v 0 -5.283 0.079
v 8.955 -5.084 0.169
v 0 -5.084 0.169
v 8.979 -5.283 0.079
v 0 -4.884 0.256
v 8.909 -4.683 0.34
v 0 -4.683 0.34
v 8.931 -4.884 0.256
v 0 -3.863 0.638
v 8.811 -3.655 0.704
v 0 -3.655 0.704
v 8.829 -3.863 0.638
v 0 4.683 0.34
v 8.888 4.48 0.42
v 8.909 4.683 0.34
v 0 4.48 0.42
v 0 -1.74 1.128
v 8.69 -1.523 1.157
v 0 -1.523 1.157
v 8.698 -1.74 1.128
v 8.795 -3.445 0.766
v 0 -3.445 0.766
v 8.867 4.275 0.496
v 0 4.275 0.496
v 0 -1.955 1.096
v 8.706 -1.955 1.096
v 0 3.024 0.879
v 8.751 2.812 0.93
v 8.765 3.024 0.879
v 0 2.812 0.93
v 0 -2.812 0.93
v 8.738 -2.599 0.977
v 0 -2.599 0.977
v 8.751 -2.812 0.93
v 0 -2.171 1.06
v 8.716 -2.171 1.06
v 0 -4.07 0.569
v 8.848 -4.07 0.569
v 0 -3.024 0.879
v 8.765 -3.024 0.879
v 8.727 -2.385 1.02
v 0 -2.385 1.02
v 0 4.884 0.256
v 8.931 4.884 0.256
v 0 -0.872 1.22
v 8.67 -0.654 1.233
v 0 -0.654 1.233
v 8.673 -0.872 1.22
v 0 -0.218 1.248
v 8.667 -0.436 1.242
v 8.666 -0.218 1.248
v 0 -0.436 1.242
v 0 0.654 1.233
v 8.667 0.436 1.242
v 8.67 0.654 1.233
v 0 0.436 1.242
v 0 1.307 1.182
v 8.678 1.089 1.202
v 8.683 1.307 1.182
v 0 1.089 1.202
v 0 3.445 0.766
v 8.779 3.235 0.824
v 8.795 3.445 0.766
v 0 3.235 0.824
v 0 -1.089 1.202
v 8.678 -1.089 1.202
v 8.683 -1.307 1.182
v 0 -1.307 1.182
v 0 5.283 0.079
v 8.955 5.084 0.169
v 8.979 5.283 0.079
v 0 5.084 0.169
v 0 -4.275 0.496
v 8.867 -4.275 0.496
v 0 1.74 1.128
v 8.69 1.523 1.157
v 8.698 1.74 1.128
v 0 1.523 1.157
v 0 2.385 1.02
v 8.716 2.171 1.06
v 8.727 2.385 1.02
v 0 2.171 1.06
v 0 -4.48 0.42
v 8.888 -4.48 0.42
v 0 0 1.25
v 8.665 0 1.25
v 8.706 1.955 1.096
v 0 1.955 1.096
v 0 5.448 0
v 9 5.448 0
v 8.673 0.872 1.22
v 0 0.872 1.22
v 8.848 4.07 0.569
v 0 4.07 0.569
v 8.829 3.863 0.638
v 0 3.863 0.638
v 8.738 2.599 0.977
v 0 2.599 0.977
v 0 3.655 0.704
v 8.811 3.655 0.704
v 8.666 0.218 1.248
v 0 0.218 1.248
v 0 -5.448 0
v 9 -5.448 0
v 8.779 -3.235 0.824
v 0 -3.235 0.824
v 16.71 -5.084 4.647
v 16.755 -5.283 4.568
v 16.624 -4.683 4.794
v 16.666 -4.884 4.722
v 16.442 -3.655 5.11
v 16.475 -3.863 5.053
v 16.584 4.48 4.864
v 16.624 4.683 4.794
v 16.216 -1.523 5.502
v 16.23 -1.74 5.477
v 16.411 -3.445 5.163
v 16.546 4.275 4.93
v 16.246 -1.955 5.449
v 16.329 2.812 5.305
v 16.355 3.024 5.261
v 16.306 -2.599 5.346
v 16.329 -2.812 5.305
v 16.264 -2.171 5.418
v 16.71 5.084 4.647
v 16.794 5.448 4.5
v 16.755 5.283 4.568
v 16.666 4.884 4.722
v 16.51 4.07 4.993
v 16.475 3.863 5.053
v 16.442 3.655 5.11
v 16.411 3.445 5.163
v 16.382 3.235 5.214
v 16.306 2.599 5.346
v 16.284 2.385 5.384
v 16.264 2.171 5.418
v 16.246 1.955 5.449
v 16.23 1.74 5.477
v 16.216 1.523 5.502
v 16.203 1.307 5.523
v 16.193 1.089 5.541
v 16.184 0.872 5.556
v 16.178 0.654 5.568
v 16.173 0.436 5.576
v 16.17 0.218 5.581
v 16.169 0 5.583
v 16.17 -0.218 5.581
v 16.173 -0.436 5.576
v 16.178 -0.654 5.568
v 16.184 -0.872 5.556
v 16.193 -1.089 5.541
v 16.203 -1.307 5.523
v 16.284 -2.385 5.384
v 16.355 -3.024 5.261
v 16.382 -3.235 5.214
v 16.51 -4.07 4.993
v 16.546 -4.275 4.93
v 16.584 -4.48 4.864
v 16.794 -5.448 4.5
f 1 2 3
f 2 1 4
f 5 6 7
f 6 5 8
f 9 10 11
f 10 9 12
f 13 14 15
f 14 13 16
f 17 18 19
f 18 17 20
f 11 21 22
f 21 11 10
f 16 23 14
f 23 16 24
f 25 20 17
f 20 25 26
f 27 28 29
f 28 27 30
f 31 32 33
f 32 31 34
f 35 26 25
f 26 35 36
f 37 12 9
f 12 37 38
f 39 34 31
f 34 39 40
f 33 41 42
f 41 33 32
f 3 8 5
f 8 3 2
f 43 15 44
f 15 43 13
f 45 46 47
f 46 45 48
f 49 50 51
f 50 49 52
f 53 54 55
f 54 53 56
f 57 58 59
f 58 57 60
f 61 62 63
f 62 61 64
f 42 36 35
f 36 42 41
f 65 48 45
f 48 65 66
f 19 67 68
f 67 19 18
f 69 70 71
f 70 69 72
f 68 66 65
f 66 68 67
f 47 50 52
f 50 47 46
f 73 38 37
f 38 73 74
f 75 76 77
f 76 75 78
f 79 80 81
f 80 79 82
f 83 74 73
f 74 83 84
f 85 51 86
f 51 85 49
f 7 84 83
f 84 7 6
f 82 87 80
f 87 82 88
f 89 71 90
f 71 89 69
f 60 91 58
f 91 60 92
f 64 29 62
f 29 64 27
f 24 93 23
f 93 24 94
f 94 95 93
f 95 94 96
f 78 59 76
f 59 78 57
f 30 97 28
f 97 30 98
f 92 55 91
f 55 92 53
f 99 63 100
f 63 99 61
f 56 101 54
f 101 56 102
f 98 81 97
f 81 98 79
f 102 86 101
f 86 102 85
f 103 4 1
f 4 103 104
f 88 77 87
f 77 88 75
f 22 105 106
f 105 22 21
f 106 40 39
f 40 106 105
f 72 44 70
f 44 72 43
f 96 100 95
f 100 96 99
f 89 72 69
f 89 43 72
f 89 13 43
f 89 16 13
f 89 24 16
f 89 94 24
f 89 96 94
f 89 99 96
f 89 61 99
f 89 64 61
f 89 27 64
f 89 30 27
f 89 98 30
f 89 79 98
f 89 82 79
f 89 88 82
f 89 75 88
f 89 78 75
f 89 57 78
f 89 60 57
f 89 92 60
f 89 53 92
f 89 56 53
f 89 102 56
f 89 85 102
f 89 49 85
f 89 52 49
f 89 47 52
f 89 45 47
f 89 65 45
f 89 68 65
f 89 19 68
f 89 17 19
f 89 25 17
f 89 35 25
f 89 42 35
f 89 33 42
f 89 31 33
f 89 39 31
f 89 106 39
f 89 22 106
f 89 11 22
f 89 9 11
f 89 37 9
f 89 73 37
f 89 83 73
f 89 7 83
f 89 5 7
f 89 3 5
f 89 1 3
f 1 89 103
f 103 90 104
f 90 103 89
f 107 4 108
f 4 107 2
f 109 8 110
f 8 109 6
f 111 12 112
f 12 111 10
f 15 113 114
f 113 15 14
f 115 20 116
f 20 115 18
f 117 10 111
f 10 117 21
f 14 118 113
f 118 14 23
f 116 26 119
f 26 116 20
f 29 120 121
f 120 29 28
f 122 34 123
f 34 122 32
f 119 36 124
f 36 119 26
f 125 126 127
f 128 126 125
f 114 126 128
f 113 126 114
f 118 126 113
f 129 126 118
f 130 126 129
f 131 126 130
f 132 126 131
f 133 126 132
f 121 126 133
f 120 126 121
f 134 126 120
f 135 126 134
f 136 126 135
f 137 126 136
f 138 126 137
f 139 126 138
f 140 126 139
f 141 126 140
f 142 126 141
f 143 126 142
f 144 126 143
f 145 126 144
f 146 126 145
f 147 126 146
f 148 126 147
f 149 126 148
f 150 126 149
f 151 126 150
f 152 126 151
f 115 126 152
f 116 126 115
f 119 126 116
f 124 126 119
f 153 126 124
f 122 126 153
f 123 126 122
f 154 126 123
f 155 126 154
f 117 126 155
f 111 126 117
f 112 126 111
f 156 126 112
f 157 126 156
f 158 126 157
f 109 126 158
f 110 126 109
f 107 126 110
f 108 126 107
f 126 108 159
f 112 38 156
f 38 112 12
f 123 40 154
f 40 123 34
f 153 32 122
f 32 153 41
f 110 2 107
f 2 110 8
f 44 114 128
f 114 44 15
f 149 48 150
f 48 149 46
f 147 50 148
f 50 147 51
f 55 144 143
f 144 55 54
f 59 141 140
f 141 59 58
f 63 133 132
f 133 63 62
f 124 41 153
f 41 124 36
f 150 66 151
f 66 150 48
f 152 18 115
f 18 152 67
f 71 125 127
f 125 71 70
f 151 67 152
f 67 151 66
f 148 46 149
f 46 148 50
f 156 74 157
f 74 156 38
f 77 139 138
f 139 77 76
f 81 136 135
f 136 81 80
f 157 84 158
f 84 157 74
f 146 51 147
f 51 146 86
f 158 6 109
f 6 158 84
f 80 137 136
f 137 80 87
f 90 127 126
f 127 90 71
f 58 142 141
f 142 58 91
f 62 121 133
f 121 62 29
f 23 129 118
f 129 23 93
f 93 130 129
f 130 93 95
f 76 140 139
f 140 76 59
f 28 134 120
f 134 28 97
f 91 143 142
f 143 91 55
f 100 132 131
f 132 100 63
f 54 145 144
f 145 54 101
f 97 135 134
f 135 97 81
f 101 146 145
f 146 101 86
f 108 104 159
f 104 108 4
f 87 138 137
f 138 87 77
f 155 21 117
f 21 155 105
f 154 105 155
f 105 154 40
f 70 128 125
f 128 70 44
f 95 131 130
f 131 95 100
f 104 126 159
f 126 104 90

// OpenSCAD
$fn = 360;
module wing() {
  translate([0,0,1]) {
  difference() {
    translate([0,0,-12.25]) rotate([0,90,0])
      cylinder(h=9, r= 12.5);
    translate([-1,-15,-31]) cube([12,30,30]);
  }
}
}

wing();
translate([9,0,0]) rotate([0,-30,0])  color("red") wing();
